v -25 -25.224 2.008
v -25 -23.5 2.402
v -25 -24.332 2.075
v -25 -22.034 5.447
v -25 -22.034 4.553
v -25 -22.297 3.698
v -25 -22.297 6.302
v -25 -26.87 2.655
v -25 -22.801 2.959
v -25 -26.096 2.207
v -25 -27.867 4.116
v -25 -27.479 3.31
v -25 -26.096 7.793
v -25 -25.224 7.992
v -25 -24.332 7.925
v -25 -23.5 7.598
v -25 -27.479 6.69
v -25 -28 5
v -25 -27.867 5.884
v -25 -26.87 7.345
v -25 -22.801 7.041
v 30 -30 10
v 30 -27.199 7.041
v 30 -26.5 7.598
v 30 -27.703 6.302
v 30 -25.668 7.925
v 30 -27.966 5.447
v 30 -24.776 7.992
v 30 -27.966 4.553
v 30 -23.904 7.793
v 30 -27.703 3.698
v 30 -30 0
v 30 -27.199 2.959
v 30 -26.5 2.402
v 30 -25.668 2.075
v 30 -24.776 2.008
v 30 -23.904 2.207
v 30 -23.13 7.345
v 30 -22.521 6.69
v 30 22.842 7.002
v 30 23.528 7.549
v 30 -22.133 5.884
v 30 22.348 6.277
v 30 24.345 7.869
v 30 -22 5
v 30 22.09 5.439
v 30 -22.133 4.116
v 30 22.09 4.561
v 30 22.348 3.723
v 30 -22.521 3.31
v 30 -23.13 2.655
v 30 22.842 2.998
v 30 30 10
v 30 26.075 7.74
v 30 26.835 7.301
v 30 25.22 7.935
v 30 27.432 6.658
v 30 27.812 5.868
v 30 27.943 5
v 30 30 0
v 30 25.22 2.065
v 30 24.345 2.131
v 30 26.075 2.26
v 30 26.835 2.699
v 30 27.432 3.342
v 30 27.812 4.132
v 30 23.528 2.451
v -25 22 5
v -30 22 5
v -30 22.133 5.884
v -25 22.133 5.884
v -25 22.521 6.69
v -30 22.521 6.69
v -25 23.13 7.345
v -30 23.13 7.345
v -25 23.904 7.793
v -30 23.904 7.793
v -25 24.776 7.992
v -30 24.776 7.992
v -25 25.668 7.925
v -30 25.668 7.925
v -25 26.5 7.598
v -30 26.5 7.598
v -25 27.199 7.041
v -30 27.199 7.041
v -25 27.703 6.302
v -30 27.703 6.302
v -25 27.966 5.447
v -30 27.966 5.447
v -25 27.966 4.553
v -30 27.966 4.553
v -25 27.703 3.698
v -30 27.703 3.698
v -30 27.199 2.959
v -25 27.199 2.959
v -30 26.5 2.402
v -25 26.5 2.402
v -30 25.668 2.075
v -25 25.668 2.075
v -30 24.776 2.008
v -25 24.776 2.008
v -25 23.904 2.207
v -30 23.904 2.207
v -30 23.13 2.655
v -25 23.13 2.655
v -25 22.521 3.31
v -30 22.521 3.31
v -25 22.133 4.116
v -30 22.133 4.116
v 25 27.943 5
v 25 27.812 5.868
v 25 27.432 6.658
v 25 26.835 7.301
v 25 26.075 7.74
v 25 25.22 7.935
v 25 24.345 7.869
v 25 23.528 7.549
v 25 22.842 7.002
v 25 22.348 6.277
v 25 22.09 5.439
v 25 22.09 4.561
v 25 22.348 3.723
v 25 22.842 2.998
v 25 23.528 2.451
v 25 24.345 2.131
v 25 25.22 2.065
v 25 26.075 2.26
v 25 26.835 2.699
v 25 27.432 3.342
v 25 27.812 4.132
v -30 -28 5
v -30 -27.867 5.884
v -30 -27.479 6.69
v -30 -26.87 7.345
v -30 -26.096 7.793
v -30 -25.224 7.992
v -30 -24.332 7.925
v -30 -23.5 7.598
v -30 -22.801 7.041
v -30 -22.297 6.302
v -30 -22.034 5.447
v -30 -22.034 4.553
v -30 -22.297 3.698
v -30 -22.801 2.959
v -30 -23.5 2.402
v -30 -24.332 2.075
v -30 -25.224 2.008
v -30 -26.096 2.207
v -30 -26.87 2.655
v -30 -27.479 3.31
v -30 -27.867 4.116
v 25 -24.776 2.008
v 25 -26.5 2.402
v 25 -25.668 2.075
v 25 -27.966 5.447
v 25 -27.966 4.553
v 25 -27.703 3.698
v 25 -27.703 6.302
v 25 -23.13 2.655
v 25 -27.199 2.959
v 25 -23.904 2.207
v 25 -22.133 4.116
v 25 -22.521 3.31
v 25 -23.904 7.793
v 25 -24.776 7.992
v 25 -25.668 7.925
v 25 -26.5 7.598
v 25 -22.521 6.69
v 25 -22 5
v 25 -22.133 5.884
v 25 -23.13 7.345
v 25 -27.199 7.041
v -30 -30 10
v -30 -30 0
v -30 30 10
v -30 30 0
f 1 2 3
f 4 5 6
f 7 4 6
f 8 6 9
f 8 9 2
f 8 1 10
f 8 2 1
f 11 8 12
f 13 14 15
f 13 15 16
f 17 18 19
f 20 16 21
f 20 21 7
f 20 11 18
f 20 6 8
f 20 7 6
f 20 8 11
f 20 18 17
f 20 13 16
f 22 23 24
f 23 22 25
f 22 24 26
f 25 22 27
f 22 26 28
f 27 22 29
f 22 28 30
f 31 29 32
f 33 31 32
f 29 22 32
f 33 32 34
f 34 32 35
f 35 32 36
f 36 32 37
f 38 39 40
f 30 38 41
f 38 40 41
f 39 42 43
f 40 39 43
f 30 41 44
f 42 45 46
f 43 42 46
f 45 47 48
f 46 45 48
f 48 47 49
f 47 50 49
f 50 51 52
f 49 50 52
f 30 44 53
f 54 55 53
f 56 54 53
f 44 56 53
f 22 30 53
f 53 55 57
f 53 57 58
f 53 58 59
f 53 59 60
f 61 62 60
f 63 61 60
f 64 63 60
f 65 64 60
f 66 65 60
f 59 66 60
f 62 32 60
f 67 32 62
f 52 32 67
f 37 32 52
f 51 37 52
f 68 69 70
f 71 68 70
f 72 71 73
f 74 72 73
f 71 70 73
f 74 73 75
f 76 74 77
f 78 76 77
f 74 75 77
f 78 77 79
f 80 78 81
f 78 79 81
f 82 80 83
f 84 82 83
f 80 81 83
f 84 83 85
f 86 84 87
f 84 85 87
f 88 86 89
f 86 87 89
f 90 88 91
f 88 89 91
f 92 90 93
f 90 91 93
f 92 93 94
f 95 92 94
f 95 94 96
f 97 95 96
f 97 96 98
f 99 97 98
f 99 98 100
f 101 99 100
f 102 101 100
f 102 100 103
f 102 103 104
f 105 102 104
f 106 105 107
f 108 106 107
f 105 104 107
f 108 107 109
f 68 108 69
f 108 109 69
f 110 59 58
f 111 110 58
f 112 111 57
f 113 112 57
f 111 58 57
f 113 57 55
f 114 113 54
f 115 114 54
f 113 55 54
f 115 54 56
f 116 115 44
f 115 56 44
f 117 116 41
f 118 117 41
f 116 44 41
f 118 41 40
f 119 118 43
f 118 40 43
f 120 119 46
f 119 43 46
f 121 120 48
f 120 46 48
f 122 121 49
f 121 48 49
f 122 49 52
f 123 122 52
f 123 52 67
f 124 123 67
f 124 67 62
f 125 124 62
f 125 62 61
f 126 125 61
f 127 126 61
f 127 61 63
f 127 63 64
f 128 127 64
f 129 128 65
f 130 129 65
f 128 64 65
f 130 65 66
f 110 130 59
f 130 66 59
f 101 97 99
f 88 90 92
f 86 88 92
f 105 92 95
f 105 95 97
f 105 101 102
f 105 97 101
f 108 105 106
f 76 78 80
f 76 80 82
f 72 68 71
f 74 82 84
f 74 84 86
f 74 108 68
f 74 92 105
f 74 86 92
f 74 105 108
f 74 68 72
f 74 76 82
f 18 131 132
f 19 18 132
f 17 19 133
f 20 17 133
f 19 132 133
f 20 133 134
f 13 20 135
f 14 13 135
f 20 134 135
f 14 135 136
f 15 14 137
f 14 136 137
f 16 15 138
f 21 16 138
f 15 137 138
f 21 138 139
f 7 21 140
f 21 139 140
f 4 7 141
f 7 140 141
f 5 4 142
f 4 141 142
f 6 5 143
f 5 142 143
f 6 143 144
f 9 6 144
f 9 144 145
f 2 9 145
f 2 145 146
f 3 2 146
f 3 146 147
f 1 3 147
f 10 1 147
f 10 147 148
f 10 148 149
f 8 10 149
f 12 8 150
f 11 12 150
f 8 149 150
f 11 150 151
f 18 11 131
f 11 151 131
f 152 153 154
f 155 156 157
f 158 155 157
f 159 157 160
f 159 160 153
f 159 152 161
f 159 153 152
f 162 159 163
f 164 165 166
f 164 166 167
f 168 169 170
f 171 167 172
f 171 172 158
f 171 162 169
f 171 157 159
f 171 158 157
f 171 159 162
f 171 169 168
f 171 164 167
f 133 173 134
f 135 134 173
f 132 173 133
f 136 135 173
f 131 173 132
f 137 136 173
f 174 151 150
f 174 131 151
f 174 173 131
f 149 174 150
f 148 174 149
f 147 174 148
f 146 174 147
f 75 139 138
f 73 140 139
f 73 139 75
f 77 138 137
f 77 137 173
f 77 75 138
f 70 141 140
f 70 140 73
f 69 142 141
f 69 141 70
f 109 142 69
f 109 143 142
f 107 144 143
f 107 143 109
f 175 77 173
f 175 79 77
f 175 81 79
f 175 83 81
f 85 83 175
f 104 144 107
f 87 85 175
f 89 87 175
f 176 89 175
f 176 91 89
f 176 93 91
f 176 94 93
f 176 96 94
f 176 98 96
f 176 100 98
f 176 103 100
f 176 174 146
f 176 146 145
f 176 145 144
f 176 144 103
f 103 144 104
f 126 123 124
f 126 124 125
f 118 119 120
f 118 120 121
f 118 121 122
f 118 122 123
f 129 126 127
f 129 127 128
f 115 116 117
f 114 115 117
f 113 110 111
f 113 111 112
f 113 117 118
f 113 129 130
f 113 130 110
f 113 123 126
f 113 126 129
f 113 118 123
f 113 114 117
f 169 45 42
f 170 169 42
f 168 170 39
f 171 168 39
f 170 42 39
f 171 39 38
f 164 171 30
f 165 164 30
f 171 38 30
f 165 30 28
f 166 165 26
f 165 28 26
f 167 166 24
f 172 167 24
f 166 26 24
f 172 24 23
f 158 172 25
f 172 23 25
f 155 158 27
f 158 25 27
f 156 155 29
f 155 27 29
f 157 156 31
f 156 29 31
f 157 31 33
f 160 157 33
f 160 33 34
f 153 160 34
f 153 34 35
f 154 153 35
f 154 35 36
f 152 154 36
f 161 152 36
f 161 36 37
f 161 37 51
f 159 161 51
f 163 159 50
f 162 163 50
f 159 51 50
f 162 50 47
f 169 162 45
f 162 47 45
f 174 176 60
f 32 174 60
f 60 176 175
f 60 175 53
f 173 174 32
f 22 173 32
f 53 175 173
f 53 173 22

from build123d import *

# Parameters (mm, degrees)
F0_W     = 60
F0_H     = 60
F1_DEPTH = 10
F2_R     = 3
F2_R_2   = 2.943246
F4_DEPTH = 5
F3_R     = 3
F5_DEPTH = 5


with BuildPart() as f1:
    # F0 (on Top) → F1 (new body)
    with BuildSketch(Plane.XY):
        Rectangle(F0_W, F0_H)
    extrude(amount=F1_DEPTH)

    # F2 (on face) → F4 (cut)
    with BuildSketch(Plane.YZ.offset(30)):
        with Locations((-25, 5)):
            Circle(F2_R)
        with Locations((25, 5)):
            Circle(F2_R_2)
    extrude(amount=-F4_DEPTH, mode=Mode.SUBTRACT)

    # F3 (on face) → F5 (cut)
    with BuildSketch(Plane(origin=(-30, 0, 0), x_dir=(0, -1, 0), z_dir=(-1, 0, 0))):
        with Locations((-25, 5)):
            Circle(F3_R)
        with Locations((25, 5)):
            Circle(F3_R)
    extrude(amount=-F5_DEPTH, mode=Mode.SUBTRACT)


solid = f1.part
